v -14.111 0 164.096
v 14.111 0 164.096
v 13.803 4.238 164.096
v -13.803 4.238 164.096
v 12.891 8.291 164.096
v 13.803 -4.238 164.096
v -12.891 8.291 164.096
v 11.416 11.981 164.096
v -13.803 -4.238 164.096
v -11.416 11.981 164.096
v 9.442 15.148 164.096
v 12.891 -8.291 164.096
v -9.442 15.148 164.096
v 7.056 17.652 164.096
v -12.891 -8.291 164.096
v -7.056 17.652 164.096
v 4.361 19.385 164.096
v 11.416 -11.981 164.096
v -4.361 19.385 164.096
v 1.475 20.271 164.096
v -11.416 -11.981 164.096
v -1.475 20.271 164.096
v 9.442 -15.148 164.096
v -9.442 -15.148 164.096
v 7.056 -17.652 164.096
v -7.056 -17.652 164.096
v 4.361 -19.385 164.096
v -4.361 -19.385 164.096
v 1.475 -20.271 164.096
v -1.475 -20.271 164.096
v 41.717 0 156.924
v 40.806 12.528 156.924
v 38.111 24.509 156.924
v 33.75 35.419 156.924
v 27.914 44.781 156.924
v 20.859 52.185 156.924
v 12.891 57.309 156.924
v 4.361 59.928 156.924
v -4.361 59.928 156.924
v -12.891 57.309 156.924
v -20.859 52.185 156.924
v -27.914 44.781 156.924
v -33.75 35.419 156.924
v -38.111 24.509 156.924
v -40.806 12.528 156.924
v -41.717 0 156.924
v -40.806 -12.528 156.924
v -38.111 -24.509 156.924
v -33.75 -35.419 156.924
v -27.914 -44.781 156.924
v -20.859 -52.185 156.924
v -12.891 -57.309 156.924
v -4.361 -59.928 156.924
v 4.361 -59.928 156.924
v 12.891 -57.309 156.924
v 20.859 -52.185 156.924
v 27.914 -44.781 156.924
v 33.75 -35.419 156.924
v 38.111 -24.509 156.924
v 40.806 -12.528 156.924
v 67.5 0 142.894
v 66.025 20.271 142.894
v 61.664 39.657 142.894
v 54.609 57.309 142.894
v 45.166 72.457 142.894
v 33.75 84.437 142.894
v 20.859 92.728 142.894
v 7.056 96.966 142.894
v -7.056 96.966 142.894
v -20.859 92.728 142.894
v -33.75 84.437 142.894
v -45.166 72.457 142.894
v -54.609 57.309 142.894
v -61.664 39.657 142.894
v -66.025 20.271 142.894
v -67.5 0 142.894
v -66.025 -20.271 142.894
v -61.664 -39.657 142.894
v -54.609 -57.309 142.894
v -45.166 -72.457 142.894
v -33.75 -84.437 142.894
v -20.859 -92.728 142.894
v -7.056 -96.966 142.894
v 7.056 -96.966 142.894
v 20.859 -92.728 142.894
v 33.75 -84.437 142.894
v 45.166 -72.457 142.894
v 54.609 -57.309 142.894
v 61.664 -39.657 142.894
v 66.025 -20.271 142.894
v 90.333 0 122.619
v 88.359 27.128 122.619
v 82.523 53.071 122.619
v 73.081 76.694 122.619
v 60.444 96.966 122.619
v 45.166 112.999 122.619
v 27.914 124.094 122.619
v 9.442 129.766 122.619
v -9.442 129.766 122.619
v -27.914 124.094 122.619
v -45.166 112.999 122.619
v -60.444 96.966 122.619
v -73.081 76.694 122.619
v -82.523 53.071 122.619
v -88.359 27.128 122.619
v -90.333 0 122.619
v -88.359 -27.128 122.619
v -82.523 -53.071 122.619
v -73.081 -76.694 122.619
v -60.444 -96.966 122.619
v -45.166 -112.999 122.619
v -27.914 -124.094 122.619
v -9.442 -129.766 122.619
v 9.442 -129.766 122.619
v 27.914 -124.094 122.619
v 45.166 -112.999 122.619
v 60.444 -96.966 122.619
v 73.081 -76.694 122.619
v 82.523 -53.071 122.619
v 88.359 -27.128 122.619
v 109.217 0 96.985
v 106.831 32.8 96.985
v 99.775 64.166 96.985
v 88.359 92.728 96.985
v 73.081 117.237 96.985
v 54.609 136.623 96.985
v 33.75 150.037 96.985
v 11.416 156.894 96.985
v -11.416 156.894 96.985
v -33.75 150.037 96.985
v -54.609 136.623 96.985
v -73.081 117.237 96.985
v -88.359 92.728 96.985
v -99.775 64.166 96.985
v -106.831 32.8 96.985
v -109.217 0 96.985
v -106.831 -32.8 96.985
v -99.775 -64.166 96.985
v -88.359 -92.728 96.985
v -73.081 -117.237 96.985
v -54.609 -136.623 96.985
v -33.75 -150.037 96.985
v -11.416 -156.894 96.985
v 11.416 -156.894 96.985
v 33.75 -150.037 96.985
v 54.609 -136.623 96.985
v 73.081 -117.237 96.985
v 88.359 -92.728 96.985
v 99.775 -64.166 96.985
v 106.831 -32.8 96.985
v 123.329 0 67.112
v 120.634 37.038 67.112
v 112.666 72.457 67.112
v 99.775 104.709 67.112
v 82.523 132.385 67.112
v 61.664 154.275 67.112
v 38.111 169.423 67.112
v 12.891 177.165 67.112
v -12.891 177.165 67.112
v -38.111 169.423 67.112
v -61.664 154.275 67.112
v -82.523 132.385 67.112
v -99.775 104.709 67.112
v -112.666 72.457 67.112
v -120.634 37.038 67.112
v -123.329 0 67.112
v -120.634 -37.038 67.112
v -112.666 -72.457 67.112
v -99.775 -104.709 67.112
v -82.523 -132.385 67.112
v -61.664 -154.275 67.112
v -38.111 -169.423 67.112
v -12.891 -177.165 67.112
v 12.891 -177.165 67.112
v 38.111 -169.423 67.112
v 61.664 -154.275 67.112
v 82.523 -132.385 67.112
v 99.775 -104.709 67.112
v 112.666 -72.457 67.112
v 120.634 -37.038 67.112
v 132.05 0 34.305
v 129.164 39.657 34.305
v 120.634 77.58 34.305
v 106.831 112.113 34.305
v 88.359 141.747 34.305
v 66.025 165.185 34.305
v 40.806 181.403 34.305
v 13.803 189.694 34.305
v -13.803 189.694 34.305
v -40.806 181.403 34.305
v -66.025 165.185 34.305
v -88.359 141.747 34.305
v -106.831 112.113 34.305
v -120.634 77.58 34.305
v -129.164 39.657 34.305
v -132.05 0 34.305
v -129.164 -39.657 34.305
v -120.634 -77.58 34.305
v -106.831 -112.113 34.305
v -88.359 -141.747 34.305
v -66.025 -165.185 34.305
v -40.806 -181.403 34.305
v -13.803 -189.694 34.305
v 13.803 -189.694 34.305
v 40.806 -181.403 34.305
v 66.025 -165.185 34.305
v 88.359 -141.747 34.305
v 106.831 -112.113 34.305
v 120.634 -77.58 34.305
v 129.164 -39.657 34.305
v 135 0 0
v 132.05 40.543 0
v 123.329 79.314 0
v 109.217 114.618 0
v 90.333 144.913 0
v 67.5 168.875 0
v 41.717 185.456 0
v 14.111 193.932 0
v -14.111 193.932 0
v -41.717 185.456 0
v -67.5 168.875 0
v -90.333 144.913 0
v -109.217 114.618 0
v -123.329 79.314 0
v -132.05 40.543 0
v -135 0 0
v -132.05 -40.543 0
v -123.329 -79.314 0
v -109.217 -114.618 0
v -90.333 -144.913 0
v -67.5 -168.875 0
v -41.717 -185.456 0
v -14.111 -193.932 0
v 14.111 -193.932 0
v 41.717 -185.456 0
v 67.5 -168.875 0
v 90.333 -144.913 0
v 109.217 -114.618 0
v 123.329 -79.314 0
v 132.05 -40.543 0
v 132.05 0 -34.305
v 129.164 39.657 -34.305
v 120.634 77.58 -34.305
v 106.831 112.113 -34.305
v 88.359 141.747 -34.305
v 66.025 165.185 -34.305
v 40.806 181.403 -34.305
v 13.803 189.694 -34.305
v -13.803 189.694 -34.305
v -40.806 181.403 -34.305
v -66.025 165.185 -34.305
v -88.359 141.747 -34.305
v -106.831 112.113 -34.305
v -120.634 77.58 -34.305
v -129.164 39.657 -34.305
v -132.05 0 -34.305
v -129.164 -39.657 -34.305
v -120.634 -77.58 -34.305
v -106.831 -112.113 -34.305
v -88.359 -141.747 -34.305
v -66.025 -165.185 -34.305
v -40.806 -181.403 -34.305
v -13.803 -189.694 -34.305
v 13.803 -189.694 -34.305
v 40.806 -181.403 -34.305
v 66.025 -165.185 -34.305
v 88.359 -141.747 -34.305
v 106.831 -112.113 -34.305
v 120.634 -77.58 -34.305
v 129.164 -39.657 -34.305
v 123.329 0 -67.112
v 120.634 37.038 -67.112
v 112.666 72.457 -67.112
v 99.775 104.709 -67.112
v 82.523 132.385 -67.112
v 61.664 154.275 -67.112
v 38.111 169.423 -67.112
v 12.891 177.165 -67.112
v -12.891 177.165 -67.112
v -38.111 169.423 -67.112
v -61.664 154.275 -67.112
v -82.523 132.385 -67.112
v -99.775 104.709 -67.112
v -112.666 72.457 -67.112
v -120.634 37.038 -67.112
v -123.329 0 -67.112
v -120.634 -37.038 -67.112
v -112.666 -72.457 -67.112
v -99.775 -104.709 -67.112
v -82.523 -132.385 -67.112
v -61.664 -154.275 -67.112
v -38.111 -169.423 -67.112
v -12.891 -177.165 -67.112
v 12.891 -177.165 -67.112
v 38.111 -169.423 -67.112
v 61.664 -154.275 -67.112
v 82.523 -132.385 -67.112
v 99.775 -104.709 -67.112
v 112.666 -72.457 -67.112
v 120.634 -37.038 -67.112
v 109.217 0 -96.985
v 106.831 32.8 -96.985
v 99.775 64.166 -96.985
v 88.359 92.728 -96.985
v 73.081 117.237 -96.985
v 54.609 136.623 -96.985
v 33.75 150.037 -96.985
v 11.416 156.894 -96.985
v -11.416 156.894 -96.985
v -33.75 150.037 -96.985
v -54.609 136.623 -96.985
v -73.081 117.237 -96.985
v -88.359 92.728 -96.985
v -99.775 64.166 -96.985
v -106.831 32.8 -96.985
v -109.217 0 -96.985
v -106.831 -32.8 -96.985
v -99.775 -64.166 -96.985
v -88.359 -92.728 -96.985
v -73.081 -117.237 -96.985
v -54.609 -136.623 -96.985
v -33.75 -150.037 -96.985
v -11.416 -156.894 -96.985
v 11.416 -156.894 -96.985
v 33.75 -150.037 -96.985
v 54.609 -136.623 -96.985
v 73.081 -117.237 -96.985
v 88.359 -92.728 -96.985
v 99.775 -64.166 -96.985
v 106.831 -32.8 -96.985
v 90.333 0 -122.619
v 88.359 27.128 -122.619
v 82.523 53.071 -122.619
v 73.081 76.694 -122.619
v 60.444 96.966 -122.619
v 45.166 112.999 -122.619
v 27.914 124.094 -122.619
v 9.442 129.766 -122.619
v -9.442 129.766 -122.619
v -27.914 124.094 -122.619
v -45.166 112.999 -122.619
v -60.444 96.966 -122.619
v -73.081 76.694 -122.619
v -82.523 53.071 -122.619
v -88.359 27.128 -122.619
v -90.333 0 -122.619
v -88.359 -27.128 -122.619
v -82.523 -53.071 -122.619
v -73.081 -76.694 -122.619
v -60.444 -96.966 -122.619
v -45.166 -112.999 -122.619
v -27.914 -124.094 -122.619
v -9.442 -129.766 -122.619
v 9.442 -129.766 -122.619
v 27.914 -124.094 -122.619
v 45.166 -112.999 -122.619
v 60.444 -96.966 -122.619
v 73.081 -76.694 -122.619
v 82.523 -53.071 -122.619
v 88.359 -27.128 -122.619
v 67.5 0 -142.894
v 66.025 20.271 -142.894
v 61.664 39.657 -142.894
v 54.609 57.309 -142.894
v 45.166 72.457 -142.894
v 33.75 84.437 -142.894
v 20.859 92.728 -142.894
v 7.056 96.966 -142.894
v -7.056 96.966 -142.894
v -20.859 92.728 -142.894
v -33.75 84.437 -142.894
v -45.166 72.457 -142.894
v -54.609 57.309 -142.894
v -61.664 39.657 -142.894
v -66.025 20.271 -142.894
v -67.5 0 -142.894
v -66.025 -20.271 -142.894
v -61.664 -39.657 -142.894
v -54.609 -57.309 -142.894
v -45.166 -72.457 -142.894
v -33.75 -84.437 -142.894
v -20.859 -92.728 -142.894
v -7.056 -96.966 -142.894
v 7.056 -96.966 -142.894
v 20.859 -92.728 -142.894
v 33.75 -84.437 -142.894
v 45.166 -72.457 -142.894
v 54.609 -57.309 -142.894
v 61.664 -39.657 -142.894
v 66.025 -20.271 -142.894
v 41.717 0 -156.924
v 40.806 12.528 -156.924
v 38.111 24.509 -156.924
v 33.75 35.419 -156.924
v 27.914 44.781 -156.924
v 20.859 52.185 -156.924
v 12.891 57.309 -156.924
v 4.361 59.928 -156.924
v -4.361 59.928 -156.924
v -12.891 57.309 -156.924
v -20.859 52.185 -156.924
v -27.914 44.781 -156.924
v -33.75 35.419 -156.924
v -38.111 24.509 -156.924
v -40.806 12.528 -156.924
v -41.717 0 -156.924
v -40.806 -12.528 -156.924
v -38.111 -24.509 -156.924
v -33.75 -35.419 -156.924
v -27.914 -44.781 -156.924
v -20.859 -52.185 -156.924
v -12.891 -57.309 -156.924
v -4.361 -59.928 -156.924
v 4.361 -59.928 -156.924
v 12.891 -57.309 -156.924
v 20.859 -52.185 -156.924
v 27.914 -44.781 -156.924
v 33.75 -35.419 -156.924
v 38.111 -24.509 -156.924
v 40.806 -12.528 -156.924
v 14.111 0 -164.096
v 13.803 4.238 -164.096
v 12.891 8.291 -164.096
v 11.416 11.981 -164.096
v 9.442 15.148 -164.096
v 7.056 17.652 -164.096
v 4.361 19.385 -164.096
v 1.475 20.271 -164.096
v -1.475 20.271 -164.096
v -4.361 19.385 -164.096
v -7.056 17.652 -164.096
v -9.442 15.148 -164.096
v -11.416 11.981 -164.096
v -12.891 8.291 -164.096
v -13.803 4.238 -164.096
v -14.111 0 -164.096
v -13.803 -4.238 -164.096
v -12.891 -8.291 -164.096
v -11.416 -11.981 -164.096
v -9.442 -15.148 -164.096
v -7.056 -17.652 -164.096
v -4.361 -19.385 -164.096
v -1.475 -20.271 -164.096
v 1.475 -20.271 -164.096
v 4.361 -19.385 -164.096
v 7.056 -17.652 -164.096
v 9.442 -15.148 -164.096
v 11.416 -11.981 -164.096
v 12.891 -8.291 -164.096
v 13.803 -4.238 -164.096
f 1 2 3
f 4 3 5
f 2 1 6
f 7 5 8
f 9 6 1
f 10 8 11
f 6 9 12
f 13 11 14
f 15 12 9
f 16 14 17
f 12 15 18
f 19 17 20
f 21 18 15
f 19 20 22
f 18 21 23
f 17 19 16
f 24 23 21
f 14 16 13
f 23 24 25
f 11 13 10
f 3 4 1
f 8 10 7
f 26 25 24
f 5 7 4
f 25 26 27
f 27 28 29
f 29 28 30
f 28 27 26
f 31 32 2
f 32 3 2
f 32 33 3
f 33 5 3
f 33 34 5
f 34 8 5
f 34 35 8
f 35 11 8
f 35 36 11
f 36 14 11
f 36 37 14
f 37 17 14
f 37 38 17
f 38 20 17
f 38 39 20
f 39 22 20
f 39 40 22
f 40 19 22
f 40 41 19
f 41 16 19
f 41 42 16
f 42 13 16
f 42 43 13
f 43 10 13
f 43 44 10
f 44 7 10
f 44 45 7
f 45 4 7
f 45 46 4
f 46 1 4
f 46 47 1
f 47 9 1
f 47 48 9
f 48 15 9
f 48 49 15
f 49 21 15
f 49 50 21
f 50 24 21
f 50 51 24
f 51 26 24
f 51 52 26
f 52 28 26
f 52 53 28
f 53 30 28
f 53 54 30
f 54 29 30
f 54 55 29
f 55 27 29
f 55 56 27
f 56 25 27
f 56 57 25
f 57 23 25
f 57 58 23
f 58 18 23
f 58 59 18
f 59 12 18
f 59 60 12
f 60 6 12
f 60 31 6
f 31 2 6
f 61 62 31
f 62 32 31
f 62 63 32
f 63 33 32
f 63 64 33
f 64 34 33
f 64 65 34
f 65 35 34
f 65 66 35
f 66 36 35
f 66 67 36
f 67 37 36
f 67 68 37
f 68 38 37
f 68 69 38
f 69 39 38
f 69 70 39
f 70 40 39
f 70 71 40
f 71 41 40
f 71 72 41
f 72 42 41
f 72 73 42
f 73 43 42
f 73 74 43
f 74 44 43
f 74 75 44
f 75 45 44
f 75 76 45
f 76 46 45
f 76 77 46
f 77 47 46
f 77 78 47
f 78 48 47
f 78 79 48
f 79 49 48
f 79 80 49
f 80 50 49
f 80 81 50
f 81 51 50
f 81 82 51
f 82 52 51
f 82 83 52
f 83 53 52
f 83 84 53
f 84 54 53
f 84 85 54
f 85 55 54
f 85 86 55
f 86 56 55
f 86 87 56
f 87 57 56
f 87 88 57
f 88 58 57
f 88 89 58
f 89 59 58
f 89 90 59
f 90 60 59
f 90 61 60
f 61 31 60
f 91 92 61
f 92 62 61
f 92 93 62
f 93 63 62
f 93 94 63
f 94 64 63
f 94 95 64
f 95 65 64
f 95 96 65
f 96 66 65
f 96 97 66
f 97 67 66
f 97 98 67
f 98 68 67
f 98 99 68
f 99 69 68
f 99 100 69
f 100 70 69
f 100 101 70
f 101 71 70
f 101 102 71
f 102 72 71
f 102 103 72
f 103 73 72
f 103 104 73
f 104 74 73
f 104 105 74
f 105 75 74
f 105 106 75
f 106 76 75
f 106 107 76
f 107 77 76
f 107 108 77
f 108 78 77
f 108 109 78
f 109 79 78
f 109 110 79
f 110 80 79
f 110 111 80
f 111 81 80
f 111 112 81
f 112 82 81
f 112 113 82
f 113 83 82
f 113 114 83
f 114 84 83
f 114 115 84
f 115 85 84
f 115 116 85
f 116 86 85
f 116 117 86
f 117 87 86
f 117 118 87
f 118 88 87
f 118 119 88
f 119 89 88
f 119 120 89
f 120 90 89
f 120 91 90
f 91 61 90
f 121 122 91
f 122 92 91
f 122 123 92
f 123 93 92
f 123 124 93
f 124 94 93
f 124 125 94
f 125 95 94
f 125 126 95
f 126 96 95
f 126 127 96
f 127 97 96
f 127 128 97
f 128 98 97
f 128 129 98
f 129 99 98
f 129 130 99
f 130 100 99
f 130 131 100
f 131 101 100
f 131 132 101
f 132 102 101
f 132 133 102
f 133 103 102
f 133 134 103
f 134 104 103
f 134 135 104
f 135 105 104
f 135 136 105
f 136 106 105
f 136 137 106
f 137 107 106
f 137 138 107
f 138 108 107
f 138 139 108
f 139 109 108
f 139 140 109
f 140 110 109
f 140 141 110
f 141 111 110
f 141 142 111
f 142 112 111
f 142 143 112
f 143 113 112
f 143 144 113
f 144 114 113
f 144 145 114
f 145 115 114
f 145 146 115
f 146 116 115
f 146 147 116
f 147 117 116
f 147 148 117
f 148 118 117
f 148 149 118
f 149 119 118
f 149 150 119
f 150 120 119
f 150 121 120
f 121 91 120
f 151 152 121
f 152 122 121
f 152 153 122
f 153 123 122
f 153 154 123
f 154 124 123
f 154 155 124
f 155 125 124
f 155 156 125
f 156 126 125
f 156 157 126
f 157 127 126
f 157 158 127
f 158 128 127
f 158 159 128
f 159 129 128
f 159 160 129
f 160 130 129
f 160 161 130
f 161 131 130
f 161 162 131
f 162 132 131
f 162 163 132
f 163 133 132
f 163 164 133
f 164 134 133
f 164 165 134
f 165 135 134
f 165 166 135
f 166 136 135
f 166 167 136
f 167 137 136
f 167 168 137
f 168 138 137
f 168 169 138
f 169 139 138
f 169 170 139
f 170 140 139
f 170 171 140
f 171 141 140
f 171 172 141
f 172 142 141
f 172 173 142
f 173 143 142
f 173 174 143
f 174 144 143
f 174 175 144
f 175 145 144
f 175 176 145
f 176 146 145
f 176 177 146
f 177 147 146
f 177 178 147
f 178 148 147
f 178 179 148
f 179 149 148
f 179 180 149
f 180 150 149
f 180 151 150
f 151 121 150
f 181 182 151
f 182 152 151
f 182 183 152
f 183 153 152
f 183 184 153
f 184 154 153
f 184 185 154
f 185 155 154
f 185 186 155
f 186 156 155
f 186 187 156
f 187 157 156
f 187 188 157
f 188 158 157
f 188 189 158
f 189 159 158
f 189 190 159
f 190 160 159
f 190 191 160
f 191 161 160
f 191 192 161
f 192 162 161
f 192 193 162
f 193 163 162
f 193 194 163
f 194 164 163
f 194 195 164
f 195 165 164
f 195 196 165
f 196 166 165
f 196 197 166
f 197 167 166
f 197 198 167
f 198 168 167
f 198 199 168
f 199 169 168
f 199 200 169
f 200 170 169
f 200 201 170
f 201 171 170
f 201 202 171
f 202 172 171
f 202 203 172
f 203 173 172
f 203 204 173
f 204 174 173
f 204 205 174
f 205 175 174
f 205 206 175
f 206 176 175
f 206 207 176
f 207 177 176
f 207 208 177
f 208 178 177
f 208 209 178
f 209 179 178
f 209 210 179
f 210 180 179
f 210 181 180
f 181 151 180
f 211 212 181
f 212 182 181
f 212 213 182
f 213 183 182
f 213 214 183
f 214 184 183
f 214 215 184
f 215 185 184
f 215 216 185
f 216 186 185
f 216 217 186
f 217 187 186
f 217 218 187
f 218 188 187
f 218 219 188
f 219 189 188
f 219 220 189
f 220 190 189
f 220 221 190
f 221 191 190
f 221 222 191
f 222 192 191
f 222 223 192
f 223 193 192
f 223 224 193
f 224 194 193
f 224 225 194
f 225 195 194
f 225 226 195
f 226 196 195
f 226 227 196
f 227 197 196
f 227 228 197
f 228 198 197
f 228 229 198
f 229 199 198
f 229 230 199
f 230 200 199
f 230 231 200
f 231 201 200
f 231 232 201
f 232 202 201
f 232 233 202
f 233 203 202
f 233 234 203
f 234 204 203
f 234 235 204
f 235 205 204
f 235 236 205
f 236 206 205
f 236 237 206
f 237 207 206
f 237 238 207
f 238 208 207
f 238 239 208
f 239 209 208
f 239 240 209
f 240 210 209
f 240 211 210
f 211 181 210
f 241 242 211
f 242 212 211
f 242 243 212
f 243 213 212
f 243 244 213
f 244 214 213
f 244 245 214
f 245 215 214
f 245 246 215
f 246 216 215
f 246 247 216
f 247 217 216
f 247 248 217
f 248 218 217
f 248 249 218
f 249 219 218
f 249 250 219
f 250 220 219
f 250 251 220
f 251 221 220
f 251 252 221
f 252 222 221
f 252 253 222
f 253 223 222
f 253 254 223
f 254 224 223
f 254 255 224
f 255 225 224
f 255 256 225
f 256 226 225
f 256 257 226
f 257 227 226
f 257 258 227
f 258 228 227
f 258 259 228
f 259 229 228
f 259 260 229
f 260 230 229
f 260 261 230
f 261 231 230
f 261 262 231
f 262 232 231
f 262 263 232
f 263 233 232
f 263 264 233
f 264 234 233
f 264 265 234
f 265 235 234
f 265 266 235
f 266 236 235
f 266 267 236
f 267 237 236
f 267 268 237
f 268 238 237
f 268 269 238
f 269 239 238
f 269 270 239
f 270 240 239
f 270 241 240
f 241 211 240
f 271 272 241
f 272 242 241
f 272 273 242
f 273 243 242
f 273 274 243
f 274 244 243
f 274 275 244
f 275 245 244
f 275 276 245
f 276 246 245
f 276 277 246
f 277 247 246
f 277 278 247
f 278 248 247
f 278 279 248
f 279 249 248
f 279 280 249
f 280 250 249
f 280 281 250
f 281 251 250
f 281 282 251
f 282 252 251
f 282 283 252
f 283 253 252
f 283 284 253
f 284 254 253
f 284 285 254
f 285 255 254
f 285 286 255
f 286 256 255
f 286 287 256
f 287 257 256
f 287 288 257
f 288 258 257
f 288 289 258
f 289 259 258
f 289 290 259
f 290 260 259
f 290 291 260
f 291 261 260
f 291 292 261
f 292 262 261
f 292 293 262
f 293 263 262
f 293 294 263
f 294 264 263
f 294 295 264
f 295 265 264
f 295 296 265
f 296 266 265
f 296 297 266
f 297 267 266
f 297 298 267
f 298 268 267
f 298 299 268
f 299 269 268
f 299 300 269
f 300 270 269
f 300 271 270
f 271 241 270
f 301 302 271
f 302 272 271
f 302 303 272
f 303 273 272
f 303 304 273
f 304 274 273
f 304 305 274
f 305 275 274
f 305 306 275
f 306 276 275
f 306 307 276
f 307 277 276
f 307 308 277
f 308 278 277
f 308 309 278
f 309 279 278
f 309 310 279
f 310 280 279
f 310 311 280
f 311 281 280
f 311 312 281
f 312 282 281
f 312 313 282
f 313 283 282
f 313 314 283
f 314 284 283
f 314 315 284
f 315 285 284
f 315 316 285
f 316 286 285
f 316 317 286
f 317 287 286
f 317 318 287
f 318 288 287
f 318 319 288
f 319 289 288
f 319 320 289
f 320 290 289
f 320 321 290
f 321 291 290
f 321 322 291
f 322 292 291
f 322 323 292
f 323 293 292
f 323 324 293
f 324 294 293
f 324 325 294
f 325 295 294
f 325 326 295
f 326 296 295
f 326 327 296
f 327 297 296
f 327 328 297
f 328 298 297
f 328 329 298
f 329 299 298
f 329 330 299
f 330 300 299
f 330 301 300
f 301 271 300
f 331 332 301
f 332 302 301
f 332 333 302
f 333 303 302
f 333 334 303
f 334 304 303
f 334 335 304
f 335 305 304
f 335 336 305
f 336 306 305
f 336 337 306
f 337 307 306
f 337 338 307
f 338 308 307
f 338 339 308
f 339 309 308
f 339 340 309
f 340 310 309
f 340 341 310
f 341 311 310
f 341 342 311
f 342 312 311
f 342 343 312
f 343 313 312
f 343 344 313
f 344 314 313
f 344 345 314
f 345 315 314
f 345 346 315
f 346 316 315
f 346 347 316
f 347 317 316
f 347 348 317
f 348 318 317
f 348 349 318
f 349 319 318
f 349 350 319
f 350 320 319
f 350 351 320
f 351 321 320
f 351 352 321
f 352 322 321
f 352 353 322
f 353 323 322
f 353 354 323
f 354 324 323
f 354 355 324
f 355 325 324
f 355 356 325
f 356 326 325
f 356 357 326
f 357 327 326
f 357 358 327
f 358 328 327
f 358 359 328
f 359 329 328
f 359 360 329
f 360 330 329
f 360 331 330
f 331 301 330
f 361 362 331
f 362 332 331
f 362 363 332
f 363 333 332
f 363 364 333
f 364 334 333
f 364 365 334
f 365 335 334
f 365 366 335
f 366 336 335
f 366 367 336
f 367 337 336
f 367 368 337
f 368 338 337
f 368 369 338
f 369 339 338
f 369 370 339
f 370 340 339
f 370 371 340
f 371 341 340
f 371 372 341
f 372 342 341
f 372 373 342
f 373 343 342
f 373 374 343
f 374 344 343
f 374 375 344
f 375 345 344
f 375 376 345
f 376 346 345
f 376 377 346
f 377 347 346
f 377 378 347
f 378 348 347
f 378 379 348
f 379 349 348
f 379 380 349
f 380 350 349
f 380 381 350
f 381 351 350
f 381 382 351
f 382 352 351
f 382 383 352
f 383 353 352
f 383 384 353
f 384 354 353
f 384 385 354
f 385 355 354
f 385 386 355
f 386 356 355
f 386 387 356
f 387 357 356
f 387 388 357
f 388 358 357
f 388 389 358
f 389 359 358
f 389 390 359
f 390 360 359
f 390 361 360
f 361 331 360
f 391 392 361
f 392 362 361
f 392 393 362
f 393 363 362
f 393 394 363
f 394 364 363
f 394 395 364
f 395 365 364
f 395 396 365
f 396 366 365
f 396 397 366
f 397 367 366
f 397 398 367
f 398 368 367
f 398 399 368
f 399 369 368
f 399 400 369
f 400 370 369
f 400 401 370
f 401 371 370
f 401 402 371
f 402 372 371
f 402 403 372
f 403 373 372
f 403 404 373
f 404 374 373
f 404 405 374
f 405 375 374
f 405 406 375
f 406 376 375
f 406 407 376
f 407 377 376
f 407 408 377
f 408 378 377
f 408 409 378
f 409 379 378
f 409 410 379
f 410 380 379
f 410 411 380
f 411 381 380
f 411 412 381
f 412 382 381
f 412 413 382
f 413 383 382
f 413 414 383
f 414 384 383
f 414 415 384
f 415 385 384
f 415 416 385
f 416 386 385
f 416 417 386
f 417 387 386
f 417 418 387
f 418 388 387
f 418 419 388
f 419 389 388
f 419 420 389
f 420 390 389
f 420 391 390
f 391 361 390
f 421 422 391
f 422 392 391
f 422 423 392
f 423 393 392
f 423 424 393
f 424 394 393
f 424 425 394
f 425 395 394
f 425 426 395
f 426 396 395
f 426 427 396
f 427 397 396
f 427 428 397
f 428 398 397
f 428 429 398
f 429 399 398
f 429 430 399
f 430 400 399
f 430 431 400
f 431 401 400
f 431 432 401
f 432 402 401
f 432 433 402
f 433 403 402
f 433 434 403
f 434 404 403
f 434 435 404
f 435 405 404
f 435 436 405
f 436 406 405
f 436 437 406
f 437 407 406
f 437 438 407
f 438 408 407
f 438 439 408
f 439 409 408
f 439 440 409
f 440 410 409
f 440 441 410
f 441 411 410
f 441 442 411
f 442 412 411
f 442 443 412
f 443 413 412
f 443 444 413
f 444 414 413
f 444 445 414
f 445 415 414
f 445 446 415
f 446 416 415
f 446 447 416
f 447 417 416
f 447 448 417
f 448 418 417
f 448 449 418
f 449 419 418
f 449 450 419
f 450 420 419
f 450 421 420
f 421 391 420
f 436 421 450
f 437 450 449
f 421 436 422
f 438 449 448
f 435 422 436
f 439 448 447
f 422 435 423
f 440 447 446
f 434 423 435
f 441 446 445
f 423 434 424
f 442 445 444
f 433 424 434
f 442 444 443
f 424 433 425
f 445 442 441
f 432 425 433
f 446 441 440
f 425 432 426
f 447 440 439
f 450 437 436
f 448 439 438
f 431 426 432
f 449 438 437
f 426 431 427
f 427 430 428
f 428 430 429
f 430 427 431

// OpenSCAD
// Generated by SolidPython 1.0.1 on 2020-07-29 00:46:48


scale(v = [9, 13, 11]) {
	sphere(r = 15);
}
/***********************************************
*********      SolidPython code:      **********
************************************************
 
# import packages: SolidPython
from solid import *
from solid.utils import *
from itertools import chain, combinations, permutations


class Resize:

    def __init__(self, scad_file):
        self.scad_file = scad_file
        #self.scad_file = import_scad(scad_file)
        # cone/cylinder param:
        self.r1 = 0
        self.r2 = 0
        self.h = 0
        # rectangular prism param:
        self.w = 0
        self.l = 0
        # ellipse param:
        self.r = 0

    # import OpenScad code (file name corresponds to shape)


    # classify shape + parameters
    def assign(self, param1, param2, param3):
        if self.scad_file == 'cone.scad':
            self.r1 = param1
            self.r2 = param2
            self.h = param3
        elif self.scad_file == 'cylinder.scad':
            self.r1 = param1
            self.r2 = param2
            self.h = param3
        elif self.scad_file == 'rectangularPrism.scad':
            self.h = param1
            self.l = param2
            self.w = param3
        else:
            self.r = param1
            self.h = param2

    # resize parameters
    def iterate(self):
        x = range(3, 20, 2)
        i = 1
        if self.scad_file == 'cone.scad':
            tempList = list(permutations(x, 2))
            for temp in tempList:
                param1 = temp[0]
                param2 = temp[1]
                filepath = 'produced_scad_files/' + 'cone' + str(param1) + '_' + str(param2) + '_' + '.scad'
                scad_render_to_file(cylinder(h=param1, r1=param2, r2=0), filepath)

        elif self.scad_file == 'cylinder.scad':
            tempList = list(permutations(x, 3))
            for temp in tempList:
                param1 = temp[0]
                param2 = temp[1]
                filepath = 'produced_scad_files/' + 'cylinder' + str(param1) + '_' + str(param2) + '_' + '.scad'
                scad_render_to_file(cylinder(h=param1, r1=param2, r2=param2), filepath)

        elif self.scad_file == 'rectangularPrism.scad':
            tempList = list(permutations(x, 3))
            for temp in tempList:
                param1 = temp[0]
                param2 = temp[1]
                param3 = temp[2]
                filepath = 'produced_scad_files/' + 'rectangularPrism' + str(param1) + '_' + str(param2) + '_' + str(
                    param3) + '.scad'
                scad_render_to_file(cube(size=(param1, param2, param3)), filepath)

        elif self.scad_file == 'ellipse.scad':
            tempList = list(permutations(x, 4))
            for temp in tempList:
                param1 = temp[0]
                param2 = temp[1]
                param3 = temp[2]
                param4 = temp[3]
                filepath = 'produced_scad_files/' + 'ellipse' + str(param1) + '_' + str(param2) + '_' + str(param3) + '_' + str(param4) + '.scad'
                scad_render_to_file(scale([param1, param2, param3])(sphere(r=param4)), filepath)

    def render_to_scadfile(self):
        scad_render_to_file(scad, 'example.scad') 
 
************************************************/
